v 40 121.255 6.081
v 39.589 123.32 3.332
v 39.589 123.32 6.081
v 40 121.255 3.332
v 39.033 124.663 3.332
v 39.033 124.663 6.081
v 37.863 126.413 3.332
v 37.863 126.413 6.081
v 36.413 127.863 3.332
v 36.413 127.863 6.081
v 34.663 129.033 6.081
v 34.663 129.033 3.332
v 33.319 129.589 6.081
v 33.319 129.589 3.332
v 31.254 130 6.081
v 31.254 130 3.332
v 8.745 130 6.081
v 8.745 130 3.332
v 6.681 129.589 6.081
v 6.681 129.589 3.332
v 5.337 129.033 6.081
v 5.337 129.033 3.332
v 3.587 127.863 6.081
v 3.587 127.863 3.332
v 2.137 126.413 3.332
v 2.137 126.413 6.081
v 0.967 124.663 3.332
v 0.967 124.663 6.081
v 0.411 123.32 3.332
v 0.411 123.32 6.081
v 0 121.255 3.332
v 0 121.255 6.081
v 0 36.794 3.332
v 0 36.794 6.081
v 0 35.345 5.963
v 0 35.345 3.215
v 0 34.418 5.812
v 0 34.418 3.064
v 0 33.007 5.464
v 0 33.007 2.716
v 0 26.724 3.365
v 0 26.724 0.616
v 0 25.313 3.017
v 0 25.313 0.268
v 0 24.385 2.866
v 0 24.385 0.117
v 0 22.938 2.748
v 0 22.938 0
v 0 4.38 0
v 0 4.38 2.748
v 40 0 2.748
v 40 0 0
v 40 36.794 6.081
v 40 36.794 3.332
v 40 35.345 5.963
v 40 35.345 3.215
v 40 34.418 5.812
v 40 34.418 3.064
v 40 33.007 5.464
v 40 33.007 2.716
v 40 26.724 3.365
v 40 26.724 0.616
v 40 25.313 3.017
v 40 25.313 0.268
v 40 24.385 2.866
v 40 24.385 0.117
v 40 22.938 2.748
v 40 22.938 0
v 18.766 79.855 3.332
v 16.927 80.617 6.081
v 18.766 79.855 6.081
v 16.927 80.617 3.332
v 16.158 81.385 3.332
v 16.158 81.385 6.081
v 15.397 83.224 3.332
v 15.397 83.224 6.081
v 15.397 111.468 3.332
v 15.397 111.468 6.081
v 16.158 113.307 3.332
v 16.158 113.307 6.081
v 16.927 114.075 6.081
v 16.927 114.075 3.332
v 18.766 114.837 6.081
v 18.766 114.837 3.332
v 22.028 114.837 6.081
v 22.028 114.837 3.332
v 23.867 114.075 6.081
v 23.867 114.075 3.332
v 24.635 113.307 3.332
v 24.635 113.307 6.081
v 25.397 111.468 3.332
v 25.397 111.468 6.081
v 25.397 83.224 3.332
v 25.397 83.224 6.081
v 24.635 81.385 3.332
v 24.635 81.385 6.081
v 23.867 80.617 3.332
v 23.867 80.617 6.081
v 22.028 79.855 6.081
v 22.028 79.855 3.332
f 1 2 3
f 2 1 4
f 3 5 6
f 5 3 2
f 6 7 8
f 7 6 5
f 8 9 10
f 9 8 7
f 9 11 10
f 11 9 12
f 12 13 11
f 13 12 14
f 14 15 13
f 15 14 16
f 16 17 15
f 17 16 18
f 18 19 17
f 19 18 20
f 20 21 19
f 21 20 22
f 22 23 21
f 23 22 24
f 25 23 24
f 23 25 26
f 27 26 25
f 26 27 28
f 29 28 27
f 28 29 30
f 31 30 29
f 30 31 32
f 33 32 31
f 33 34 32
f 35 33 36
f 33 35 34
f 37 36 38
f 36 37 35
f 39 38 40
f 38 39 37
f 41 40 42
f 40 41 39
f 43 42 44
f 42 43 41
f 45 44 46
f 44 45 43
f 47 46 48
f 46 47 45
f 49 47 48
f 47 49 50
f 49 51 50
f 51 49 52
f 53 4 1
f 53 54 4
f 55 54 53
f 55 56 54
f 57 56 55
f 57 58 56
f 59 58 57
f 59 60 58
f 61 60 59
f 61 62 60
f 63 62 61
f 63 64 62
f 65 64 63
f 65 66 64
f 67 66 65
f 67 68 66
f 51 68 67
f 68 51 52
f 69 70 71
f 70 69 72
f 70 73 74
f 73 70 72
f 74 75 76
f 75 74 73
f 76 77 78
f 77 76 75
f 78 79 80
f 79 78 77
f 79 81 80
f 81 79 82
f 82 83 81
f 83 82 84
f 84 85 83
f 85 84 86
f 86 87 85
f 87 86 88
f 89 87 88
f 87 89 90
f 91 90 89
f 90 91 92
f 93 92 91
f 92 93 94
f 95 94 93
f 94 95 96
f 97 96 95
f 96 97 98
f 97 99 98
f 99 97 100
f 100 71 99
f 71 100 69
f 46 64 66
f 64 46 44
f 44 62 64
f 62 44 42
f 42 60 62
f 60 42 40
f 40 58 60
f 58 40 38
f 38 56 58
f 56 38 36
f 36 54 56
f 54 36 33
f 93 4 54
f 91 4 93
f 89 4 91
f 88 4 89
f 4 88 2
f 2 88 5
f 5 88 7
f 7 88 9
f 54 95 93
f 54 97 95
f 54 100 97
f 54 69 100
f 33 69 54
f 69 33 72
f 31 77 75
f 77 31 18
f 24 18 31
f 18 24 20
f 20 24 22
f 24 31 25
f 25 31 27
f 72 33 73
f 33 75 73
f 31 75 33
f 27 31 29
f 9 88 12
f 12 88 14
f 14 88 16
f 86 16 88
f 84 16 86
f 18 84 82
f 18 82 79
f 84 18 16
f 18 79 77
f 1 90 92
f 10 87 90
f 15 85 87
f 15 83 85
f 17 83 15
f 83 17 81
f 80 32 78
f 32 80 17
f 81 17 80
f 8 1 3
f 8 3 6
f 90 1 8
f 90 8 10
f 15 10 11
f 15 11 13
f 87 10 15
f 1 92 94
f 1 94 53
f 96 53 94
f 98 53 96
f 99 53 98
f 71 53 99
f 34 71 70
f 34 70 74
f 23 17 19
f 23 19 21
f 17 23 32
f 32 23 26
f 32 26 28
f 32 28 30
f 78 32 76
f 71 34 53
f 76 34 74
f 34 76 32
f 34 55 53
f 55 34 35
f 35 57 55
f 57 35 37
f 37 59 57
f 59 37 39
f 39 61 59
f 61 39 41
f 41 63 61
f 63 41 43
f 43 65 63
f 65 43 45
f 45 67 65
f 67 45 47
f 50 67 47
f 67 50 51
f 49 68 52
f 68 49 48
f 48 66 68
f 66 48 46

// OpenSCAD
// oyl_mount_tab.scad — slotted mounting tab with bent foot (part03, exact recreation)
// Sheet-metal-style part: a plan footprint (rounded corners, slanted foot tip,
// slot) bent along its length. Built as the intersection of two extrusions:
//   1. the plan footprint (minus slot) extruded vertically, and
//   2. the bend profile (a mid-width cross-section) extruded across the width.
// Exact because the side walls are vertical and the bend is uniform across X.
// Local frame: origin at bbox min; width 40.0 along X, length along Y, bend in Z.

width = 40.0004;

// plan footprint, projected from the mesh
outline = [
    [0.0000, 121.2547], [0.4113, 123.3196], [0.9668, 124.6630], [2.1372, 126.4133],
    [3.5869, 127.8634], [5.3374, 129.0333], [6.6807, 129.5894], [8.7453, 130.0005],
    [31.2541, 130.0005], [33.3186, 129.5894], [34.6630, 129.0333], [36.4135, 127.8634],
    [37.8632, 126.4133], [39.0326, 124.6630], [39.5891, 123.3196], [40.0004, 121.2547],
    [40.0004, 0.0000], [0.0000, 4.3799]
];

// slot hole
slot = [
    [22.0279, 79.8555], [23.8674, 80.6170], [24.6347, 81.3854], [25.3969, 83.2245],
    [25.3969, 111.4683], [24.6347, 113.3074], [23.8674, 114.0753], [22.0279, 114.8373],
    [18.7664, 114.8373], [16.9268, 114.0753], [16.1585, 113.3074], [15.3974, 111.4683],
    [15.3974, 83.2245], [16.1585, 81.3854], [16.9268, 80.6170], [18.7664, 79.8555]
];

// bend profile in (Y,Z), sectioned at mid-width
bend_profile = [
    [126.2850, 3.3322], [131.0000, 3.3322], [131.0000, 6.0807], [36.7940, 6.0807],
    [35.3455, 5.9635], [34.4176, 5.8125], [33.0073, 5.4645], [26.7241, 3.3646],
    [25.3134, 3.0166], [24.3854, 2.8656], [22.9375, 2.7484], [-1.0000, 2.7484],
    [-1.0000, 0.0000], [22.9375, 0.0000], [24.3854, 0.1172], [25.3134, 0.2682],
    [26.7241, 0.6161], [33.0073, 2.7161], [34.4176, 3.0641], [35.3455, 3.2150],
    [36.7940, 3.3322], [125.0757, 3.3322]
];

module mount_tab() {
    intersection() {
        translate([0, 0, -1])
            linear_extrude(height = 6.081 + 2)
                difference() {
                    polygon(outline);
                    polygon(slot);
                }
        translate([-0.5, 0, 0])
            rotate([90, 0, 90])
                linear_extrude(height = width + 1)
                    polygon(bend_profile);
    }
}

mount_tab();
